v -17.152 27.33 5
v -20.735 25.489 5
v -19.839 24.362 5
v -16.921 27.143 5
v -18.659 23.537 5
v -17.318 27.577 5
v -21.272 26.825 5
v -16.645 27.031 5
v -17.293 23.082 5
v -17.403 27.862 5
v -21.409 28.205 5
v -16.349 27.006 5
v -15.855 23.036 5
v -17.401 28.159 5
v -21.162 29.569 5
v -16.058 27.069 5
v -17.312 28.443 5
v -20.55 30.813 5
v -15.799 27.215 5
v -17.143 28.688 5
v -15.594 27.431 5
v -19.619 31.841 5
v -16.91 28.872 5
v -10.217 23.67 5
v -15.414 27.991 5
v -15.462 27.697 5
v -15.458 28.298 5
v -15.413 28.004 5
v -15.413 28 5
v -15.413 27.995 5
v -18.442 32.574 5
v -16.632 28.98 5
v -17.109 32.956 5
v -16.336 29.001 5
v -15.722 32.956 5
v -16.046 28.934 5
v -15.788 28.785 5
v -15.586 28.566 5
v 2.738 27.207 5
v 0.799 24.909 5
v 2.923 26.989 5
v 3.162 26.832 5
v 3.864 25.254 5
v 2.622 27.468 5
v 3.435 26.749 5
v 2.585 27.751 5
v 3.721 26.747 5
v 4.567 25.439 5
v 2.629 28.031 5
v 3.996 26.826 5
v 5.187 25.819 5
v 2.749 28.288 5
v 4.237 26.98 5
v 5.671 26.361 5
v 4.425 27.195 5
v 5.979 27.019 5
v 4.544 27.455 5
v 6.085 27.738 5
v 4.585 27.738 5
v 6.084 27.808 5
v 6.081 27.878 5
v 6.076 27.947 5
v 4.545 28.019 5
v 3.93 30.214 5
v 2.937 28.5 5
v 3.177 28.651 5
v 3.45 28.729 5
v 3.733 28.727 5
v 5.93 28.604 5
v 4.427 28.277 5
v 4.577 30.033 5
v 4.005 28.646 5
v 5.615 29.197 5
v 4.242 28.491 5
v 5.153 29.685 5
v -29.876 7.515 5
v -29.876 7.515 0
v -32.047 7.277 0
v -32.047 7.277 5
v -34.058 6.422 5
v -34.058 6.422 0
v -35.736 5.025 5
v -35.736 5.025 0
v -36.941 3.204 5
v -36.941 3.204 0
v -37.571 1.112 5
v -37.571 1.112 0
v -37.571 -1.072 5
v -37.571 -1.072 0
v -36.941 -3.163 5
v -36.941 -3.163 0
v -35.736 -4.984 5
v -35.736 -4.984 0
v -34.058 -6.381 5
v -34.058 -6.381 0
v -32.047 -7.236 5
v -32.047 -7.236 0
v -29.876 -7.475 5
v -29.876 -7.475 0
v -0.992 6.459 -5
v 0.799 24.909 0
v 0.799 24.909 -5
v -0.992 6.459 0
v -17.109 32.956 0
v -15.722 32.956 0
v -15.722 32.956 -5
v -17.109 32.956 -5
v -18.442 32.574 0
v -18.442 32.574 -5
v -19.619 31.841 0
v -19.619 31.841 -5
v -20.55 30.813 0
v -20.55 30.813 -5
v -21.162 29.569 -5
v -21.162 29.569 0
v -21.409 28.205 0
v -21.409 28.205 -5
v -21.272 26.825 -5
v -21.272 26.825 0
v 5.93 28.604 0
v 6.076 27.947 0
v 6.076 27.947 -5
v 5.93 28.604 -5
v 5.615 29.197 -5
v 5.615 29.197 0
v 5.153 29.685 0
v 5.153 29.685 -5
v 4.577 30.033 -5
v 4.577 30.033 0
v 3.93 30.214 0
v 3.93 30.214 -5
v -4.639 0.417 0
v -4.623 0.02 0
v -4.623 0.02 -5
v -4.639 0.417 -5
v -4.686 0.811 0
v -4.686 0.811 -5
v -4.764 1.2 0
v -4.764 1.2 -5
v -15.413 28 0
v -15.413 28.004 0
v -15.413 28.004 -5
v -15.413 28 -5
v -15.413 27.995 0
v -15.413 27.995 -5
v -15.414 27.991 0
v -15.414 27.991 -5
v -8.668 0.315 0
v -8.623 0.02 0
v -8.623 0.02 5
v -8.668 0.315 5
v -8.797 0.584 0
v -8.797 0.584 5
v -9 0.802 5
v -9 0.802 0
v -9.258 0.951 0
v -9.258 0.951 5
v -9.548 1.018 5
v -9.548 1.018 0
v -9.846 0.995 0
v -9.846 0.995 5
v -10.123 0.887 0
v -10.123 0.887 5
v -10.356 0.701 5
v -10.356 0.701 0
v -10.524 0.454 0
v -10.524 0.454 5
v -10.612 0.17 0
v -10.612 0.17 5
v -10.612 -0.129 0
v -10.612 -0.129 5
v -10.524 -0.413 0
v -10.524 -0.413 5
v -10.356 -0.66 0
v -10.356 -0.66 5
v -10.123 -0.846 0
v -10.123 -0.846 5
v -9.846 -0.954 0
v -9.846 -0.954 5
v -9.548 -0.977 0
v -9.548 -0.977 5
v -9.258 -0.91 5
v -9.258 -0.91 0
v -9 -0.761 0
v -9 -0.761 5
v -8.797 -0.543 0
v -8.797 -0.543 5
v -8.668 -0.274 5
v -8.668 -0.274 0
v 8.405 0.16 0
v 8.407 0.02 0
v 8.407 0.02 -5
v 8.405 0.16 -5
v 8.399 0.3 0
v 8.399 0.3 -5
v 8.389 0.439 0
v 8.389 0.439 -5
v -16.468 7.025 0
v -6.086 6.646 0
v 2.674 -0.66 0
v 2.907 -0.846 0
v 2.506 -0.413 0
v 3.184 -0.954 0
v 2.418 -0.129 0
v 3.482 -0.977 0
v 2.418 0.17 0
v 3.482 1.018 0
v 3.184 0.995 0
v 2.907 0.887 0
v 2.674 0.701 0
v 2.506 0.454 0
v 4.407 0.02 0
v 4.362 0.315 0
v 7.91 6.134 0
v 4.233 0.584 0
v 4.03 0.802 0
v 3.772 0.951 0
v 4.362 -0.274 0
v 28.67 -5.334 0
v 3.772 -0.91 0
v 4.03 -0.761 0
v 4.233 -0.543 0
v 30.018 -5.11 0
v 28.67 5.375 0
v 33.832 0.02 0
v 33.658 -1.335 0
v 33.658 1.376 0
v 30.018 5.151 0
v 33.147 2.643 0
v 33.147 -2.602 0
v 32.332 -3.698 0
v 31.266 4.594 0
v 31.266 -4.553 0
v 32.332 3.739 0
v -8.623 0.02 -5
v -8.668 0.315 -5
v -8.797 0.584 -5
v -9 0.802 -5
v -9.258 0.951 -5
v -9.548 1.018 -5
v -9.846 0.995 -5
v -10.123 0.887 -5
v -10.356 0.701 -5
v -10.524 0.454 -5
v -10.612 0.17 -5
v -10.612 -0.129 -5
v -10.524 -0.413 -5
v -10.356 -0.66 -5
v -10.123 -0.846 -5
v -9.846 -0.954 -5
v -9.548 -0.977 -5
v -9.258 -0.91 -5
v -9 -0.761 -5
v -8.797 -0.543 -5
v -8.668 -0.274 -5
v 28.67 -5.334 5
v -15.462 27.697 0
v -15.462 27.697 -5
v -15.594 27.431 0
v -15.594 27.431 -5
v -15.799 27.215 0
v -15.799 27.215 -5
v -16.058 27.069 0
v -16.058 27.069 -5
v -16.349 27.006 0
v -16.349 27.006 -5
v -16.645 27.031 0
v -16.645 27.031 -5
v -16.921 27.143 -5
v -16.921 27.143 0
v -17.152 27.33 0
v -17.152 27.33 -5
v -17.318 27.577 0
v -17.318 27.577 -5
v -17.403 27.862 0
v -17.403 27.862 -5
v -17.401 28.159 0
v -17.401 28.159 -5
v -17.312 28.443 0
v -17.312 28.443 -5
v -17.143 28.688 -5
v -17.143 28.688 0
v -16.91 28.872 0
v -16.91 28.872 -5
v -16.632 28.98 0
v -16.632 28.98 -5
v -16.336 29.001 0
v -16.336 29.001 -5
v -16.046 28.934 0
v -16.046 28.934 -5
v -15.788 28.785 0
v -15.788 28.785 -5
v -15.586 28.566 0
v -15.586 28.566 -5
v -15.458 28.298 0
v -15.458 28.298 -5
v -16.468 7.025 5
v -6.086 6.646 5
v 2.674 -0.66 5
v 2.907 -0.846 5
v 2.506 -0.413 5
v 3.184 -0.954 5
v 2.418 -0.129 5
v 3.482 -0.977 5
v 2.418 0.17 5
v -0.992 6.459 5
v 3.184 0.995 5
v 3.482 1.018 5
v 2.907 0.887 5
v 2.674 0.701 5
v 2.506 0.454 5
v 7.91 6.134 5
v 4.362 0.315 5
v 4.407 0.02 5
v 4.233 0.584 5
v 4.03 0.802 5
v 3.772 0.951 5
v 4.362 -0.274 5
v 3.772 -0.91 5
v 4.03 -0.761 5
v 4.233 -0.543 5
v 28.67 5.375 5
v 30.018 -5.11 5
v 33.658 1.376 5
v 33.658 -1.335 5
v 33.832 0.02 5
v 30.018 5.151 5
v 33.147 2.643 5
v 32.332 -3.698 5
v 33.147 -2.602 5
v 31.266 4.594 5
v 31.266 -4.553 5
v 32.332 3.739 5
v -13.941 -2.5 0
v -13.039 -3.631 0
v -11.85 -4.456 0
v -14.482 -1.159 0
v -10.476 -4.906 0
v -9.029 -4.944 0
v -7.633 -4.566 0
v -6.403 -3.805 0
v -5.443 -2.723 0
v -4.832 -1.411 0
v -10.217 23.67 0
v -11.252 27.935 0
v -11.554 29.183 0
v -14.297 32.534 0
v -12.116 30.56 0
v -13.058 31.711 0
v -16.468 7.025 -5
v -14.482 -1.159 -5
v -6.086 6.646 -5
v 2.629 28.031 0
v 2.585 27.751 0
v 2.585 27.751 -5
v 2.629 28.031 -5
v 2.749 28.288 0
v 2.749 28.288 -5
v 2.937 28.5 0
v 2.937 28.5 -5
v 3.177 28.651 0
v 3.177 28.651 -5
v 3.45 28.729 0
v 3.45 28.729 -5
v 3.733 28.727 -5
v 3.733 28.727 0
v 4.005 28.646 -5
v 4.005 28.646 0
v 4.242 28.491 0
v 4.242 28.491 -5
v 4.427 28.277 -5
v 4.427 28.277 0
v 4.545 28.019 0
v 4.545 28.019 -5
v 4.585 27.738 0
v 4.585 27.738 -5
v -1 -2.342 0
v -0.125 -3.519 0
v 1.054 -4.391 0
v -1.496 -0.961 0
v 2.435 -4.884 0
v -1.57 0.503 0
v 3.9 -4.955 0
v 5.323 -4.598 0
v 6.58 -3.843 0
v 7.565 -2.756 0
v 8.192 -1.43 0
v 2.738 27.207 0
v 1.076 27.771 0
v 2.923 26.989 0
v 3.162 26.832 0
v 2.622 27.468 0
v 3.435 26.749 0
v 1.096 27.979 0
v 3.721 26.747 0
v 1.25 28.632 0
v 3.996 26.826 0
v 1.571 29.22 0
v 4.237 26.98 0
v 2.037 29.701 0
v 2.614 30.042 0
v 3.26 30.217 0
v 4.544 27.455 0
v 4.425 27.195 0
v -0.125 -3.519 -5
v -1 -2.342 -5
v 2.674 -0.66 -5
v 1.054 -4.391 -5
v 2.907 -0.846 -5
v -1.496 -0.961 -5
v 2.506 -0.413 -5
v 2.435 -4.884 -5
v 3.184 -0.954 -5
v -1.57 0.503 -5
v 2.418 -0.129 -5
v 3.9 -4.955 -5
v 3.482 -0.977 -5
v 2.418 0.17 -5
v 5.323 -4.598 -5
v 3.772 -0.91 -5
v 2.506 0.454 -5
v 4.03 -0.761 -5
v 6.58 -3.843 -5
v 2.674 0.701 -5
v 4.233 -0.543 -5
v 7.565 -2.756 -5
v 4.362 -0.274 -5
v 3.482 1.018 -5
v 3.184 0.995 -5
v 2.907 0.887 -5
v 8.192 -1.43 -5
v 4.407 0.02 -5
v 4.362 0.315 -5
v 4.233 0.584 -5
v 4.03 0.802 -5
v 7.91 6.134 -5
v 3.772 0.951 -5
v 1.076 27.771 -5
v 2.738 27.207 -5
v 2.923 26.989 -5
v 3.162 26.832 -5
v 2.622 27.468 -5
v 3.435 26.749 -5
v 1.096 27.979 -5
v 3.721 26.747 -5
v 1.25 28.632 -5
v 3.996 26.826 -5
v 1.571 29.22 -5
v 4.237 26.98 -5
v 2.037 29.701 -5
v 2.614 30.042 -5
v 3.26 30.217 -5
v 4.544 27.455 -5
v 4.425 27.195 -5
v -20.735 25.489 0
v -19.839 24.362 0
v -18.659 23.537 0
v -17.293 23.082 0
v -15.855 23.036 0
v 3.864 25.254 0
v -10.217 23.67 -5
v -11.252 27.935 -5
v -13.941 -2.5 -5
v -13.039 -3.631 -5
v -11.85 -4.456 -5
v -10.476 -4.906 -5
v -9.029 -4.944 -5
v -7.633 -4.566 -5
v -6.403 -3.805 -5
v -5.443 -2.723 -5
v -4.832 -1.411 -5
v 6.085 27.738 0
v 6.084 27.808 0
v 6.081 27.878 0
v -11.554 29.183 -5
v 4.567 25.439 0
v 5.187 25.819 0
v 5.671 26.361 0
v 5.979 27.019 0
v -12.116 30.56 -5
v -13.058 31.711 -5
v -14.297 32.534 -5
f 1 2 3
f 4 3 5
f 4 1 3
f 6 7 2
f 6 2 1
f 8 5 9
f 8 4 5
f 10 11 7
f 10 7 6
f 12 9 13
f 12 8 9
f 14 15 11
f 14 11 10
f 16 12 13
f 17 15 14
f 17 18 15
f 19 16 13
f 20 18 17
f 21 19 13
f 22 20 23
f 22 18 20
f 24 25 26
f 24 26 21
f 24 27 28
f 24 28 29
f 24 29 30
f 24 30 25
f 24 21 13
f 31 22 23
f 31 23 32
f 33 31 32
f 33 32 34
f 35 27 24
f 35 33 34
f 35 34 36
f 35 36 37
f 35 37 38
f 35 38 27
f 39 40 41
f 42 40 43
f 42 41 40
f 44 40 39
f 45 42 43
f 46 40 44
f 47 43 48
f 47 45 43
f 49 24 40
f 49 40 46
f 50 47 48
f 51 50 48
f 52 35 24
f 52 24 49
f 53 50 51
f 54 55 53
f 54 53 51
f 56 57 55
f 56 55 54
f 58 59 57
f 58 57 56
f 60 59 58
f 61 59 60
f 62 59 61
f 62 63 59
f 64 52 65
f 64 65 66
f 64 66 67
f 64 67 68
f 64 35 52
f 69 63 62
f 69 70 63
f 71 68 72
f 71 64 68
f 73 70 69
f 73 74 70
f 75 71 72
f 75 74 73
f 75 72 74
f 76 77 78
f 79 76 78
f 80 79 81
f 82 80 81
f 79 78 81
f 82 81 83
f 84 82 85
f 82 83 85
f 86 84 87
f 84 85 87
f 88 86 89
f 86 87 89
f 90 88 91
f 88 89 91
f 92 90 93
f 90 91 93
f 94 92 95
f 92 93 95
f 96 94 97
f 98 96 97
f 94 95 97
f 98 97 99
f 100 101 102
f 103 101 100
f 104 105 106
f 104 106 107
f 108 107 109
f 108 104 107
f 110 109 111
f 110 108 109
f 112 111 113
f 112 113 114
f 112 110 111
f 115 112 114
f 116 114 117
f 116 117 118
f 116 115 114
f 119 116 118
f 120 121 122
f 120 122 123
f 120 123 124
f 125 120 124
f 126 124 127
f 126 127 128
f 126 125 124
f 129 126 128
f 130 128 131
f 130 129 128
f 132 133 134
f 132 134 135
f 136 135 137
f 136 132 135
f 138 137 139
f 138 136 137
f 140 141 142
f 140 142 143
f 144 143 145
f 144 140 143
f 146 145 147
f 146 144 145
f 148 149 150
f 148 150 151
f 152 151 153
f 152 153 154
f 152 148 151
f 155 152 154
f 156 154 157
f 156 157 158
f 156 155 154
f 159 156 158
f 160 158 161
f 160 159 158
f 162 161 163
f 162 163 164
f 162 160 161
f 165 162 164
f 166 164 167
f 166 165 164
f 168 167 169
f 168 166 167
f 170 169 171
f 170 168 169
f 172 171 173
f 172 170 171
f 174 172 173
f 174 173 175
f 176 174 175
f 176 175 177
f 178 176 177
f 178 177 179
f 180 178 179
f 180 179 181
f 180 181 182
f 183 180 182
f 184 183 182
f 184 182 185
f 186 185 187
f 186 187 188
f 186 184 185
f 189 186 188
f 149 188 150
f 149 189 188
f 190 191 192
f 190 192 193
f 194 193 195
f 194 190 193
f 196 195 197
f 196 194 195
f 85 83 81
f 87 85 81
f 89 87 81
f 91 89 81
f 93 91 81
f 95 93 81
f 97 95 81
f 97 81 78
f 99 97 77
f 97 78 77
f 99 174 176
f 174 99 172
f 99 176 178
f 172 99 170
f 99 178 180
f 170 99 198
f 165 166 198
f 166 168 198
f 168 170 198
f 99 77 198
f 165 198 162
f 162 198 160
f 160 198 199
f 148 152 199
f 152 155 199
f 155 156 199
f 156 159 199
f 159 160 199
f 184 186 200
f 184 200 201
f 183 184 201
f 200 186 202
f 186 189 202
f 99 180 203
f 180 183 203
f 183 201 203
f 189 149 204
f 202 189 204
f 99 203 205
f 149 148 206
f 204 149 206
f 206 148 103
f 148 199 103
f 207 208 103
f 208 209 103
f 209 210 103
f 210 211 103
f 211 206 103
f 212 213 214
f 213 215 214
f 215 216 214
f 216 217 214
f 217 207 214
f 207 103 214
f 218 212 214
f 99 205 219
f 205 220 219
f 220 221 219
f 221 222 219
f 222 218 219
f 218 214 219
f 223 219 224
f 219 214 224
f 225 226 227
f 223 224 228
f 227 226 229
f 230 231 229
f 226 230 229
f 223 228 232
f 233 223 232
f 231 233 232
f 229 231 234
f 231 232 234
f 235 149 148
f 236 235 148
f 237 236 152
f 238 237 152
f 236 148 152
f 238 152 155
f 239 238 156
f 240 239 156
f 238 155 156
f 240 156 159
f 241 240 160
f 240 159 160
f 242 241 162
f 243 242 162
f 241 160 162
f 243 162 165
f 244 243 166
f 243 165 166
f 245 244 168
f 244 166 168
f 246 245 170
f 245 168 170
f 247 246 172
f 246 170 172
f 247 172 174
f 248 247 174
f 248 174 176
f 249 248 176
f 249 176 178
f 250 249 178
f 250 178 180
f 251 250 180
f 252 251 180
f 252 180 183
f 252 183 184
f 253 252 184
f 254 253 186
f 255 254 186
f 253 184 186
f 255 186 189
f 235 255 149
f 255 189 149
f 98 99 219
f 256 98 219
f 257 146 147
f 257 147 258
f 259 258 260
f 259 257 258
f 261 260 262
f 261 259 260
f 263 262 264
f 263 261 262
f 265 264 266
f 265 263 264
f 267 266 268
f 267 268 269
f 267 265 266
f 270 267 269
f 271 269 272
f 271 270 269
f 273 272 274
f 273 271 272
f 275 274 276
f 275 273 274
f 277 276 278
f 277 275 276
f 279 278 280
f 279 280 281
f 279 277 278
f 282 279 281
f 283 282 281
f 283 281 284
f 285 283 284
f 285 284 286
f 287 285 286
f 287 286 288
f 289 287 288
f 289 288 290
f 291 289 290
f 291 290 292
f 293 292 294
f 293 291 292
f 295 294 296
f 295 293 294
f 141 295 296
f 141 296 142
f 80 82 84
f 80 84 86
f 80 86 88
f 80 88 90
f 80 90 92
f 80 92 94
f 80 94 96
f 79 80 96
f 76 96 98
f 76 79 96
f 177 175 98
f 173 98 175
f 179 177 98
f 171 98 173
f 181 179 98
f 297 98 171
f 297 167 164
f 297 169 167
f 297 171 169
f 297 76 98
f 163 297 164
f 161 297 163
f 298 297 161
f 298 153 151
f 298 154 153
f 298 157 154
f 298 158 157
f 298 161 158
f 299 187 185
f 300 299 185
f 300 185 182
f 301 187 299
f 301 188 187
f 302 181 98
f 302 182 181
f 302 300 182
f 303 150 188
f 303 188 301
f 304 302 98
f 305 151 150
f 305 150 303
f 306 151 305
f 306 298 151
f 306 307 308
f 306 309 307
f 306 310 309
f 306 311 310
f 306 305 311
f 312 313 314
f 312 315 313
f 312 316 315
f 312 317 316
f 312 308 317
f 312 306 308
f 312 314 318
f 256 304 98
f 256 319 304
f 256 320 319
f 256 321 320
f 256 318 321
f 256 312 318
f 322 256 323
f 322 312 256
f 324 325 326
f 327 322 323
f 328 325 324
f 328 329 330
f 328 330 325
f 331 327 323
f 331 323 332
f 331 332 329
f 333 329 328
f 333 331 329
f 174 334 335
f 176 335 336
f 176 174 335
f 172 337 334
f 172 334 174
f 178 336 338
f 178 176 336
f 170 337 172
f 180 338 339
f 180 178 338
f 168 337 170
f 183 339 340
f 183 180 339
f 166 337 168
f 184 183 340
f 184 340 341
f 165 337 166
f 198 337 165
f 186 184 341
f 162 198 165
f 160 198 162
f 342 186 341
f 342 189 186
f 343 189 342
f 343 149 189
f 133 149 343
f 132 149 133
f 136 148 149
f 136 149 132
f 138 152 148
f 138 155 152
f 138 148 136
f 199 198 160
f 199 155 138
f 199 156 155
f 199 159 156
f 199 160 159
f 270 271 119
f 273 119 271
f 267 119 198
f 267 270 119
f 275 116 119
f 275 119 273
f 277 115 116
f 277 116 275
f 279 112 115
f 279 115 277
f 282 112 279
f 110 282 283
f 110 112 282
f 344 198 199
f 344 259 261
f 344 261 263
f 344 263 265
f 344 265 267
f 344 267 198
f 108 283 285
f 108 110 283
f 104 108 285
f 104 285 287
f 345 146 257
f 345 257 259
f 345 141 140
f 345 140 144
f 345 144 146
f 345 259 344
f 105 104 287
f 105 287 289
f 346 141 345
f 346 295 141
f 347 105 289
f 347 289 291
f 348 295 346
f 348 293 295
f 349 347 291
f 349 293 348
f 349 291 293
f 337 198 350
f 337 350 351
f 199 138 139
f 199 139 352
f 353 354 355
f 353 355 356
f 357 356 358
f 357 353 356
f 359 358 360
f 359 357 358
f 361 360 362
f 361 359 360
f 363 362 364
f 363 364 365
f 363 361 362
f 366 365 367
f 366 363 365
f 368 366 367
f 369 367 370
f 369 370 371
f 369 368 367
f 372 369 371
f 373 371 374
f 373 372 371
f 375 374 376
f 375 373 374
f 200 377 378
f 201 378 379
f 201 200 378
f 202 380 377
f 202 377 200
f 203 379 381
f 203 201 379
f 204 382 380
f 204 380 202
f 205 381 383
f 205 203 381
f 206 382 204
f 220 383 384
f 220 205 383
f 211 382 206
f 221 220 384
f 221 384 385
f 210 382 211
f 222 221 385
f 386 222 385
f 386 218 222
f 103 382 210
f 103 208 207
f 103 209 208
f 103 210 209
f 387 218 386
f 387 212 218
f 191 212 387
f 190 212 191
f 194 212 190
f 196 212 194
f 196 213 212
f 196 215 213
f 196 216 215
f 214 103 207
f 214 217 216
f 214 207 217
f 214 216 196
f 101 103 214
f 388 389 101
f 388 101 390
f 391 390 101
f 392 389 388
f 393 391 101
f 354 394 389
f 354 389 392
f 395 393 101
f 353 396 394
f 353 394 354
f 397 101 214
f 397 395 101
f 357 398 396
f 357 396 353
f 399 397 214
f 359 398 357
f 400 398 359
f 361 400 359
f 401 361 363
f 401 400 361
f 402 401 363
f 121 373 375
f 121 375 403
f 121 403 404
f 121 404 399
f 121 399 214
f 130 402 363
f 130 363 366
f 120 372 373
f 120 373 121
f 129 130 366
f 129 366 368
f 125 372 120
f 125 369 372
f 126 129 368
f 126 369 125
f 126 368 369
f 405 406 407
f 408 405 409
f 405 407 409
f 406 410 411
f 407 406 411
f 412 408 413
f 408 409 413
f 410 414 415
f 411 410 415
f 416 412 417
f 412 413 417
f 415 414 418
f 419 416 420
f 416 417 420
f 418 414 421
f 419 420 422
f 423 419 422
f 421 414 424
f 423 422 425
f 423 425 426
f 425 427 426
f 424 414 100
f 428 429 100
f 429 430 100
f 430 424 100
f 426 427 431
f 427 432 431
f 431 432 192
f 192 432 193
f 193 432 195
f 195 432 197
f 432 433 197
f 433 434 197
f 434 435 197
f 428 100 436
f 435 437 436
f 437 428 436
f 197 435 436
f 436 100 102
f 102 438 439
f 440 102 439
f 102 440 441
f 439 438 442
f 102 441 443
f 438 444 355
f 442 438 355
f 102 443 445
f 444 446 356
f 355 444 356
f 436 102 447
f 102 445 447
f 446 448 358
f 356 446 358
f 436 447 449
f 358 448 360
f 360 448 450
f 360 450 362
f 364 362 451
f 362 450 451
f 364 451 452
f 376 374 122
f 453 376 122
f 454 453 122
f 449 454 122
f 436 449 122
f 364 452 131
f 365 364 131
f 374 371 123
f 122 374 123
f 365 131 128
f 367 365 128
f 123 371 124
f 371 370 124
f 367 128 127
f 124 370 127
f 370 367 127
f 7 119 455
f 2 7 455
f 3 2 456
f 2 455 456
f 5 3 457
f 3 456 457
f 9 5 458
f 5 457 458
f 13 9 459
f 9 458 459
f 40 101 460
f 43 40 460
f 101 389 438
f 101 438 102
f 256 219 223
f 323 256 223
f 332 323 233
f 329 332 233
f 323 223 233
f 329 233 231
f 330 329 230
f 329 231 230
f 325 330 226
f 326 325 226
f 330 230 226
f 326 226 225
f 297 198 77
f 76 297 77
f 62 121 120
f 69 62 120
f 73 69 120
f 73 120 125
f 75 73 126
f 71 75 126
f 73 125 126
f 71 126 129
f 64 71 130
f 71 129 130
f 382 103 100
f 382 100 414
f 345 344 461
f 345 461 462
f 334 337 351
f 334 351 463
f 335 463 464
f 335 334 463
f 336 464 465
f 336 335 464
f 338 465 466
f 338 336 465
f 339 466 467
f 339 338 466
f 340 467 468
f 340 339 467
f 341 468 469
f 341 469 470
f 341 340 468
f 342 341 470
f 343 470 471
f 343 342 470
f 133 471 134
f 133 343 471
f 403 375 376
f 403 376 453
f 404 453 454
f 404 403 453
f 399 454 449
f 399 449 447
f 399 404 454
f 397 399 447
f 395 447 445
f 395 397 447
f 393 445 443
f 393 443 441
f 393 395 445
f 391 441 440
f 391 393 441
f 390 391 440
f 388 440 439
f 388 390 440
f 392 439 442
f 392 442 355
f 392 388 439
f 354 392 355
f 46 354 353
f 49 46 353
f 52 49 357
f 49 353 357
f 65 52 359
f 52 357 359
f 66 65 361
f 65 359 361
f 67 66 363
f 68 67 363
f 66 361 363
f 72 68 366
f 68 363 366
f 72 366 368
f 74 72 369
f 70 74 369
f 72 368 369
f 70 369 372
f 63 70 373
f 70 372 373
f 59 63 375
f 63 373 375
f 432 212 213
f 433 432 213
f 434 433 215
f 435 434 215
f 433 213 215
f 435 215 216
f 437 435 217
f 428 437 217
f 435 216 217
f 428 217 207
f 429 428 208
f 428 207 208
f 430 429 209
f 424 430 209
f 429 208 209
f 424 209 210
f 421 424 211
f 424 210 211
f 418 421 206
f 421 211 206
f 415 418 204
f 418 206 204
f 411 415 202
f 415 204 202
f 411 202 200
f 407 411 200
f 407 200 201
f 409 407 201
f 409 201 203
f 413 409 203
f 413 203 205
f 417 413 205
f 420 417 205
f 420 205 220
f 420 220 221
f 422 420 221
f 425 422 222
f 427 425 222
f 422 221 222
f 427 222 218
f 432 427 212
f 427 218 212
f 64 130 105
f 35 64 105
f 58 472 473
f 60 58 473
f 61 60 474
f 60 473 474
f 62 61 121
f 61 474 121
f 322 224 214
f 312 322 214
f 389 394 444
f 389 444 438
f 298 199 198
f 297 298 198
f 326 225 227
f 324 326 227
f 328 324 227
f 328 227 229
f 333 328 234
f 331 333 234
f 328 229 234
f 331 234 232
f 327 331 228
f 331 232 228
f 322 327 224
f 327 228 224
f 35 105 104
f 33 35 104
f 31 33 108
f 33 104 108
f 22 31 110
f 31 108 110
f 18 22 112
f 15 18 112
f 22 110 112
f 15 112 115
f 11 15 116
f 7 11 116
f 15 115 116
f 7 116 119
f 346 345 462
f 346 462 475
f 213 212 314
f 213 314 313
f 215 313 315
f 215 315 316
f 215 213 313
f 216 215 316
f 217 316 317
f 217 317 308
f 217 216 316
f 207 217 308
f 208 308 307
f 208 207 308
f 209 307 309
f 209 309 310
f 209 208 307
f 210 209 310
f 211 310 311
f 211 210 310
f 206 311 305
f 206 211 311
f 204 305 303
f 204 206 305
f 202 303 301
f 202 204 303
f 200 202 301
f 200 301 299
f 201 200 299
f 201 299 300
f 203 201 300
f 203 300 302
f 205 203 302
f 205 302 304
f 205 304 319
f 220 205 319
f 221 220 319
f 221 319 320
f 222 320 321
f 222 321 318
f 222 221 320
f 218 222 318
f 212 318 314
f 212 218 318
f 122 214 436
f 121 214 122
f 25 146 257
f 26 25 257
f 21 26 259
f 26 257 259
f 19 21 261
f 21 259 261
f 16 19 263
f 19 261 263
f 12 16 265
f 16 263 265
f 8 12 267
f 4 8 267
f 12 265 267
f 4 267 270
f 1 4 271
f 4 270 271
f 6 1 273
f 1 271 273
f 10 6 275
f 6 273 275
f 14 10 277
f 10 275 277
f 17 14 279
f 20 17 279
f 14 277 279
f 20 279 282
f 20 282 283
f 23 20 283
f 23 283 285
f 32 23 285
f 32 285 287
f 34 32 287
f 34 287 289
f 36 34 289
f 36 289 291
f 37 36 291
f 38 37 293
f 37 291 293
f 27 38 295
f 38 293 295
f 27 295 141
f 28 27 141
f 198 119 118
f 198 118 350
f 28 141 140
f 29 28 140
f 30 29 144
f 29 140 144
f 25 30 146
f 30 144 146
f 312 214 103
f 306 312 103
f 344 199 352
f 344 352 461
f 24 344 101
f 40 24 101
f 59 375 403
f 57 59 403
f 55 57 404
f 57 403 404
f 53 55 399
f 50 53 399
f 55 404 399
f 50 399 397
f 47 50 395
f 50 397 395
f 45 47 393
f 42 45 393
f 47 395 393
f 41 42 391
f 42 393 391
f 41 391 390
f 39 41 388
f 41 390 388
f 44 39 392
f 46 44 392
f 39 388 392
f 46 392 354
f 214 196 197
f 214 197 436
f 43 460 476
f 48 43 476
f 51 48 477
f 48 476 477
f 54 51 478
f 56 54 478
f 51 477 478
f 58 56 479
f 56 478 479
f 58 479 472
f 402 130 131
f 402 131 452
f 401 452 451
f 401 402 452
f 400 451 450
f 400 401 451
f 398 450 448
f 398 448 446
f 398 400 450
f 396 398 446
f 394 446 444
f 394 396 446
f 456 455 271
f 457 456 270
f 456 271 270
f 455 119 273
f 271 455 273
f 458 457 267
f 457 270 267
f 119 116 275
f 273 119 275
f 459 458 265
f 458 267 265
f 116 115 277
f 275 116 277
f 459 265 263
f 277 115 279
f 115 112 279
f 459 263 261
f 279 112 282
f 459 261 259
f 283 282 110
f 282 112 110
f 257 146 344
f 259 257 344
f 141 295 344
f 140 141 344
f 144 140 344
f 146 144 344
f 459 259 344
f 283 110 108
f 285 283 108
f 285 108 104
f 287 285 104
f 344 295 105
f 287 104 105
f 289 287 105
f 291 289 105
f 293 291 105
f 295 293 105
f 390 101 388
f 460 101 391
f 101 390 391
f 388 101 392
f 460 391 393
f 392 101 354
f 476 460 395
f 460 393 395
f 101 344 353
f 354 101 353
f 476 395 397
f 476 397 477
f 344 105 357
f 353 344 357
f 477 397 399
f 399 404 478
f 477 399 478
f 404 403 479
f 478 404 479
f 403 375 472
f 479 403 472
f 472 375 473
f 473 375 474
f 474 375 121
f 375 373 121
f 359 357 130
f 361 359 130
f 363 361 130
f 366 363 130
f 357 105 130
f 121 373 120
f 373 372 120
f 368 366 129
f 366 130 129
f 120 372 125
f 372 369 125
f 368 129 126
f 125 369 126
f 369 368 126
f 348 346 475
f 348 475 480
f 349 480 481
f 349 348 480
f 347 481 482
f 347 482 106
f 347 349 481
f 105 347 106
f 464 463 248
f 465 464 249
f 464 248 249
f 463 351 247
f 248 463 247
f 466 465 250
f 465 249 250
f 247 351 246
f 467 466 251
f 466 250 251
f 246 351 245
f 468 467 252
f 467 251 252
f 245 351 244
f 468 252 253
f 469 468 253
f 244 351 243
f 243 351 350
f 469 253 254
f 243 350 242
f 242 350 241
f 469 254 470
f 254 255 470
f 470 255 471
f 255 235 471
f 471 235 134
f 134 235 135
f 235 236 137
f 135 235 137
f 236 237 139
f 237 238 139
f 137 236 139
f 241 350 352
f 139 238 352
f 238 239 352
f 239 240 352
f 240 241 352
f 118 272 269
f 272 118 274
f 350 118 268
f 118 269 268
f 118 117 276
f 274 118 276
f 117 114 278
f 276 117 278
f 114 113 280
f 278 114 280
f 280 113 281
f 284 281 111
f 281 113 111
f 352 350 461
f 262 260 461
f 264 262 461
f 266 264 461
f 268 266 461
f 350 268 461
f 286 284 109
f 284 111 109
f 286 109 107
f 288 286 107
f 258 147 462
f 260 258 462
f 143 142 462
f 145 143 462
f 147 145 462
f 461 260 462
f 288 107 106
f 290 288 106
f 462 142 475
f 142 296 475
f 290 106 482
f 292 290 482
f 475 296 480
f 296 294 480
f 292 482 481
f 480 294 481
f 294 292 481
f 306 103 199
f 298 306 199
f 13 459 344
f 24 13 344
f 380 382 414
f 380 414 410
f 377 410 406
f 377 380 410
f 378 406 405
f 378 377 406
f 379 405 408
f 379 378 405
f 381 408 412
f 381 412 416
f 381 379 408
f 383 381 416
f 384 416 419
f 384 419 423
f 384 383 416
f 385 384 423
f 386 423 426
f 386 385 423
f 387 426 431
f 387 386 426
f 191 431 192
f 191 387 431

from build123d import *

# Parameters (mm, degrees)
F1_DEPTH = 5
F0_R     = 1
F2_DEPTH = 5


with BuildPart() as f1:
    # F0 (on Top) → F1 (new body)
    with BuildSketch(Plane.XY):
        with BuildLine():
            ThreePointArc((-15.854500332, 23.0355131938), (-12.7077701873, 24.6473721814), (-11.4138670862, 27.9376327737))
            ThreePointArc((-11.4138670862, 27.9376327737), (-11.4135349787, 27.9709033455), (-11.4134242746, 28.0041753906))
            ThreePointArc((-11.4134242746, 28.0041753906), (-11.4488005891, 28.5979023154), (-11.5544289391, 29.1832276921))
            ThreePointArc((-11.5544289391, 29.1832276921), (-13.057928846, 31.7110137238), (-15.72245892, 32.9562019333))
            ThreePointArc((-15.72245892, 32.9562019333), (-20.1202626078, 31.3596708193), (-21.2724196101, 26.8251230892))
            ThreePointArc((-21.2724196101, 26.8251230892), (-19.279246894, 23.9069738196), (-15.854500332, 23.0355131938))
        make_face()
        with BuildLine():
            ThreePointArc((-15.4134242746, 28.0041753906), (-15.4134464154, 27.9975209816), (-15.4135128369, 27.9908668673))
            ThreePointArc((-15.4135128369, 27.9908668673), (-17.4134021338, 28.0108297997), (-15.4134242746, 28.0041753906))
        make_face(mode=Mode.SUBTRACT)
        with BuildLine():
            Line((-11.5544289391, 29.1832276921), (-11.2516570719, 27.9354738067))
            Line((-11.2516570719, 27.9354738067), (1.0763007318, 27.7713923605))
            Line((1.0763007318, 27.7713923605), (1.0964932824, 27.9794741519))
            ThreePointArc((1.0964932824, 27.9794741519), (2.036829904, 29.7011082607), (3.9302871563, 30.2140181942))
            Line((3.9302871563, 30.2140181942), (-15.72245892, 32.9562019333))
            ThreePointArc((-15.72245892, 32.9562019333), (-13.057928846, 31.7110137238), (-11.5544289391, 29.1832276921))
        make_face()
        with BuildLine():
            ThreePointArc((1.0964932824, 27.9794741519), (1.0885880353, 27.875494799), (1.0850258848, 27.7712762313))
            ThreePointArc((1.0850258848, 27.7712762313), (1.9064028744, 25.8851778792), (3.8642664503, 25.2536738244))
            ThreePointArc((3.8642664503, 25.2536738244), (5.4487592704, 26.0719699485), (6.084804479, 27.7380049229))
            ThreePointArc((6.084804479, 27.7380049229), (6.0826053348, 27.842842344), (6.0760117711, 27.9474953231))
            ThreePointArc((6.0760117711, 27.9474953231), (5.400288981, 29.4567300385), (3.9302871563, 30.2140181942))
            ThreePointArc((3.9302871563, 30.2140181942), (2.036829904, 29.7011082607), (1.0964932824, 27.9794741519))
        make_face()
        with BuildLine():
            ThreePointArc((4.584804479, 27.7380049229), (3.57815007, 26.7380270637), (2.5848930414, 27.7513134463))
            ThreePointArc((2.5848930414, 27.7513134463), (3.5914588881, 28.737982782), (4.584804479, 27.7380049229))
        make_face(mode=Mode.SUBTRACT)
        with BuildLine():
            Line((1.0850258848, 27.7712762313), (1.0763007318, 27.7713923605))
            Line((1.0763007318, 27.7713923605), (0.7985114663, 24.9088075818))
            Line((0.7985114663, 24.9088075818), (3.8642664503, 25.2536738244))
            ThreePointArc((3.8642664503, 25.2536738244), (1.9064028744, 25.8851778792), (1.0850258848, 27.7712762313))
        make_face()
        Polygon((1.0763007318, 27.7713923605), (-11.2516570719, 27.9354738067), (-10.2165579676, 23.6697243455), (0.7985114663, 24.9088075818), align=None)
        with BuildLine():
            Line((-11.2516570719, 27.9354738067), (-11.4138670862, 27.9376327737))
            ThreePointArc((-11.4138670862, 27.9376327737), (-12.7077701873, 24.6473721814), (-15.854500332, 23.0355131938))
            Line((-15.854500332, 23.0355131938), (-10.2165579676, 23.6697243455))
            Line((-10.2165579676, 23.6697243455), (-11.2516570719, 27.9354738067))
        make_face()
        with BuildLine():
            ThreePointArc((-11.4134242746, 28.0041753906), (-11.4135349787, 27.9709033455), (-11.4138670862, 27.9376327737))
            Line((-11.4138670862, 27.9376327737), (-11.2516570719, 27.9354738067))
            Line((-11.2516570719, 27.9354738067), (-11.5544289391, 29.1832276921))
            ThreePointArc((-11.5544289391, 29.1832276921), (-11.4488005891, 28.5979023154), (-11.4134242746, 28.0041753906))
        make_face()
        with BuildLine():
            Line((1.0964932824, 27.9794741519), (1.0763007318, 27.7713923605))
            Line((1.0763007318, 27.7713923605), (1.0850258848, 27.7712762313))
            ThreePointArc((1.0850258848, 27.7712762313), (1.0885880353, 27.875494799), (1.0964932824, 27.9794741519))
        make_face()
    extrude(amount=F1_DEPTH)


with BuildPart() as f1b:
    # F0 (on Top) → F1, piece 2 (new body)
    with BuildSketch(Plane.XY):
        with BuildLine():
            ThreePointArc((-22.6505047828, 0.0204806253), (-24.751195421, 5.2260025411), (-29.8764936936, 7.5154734821))
            ThreePointArc((-29.8764936936, 7.5154734821), (-37.6505047828, 0.0204806253), (-29.8764936936, -7.4745122315))
            ThreePointArc((-29.8764936936, -7.4745122315), (-24.751195421, -5.1850412904), (-22.6505047828, 0.0204806253))
        make_face()
        with BuildLine():
            Line((-0.9918379888, 6.4594730131), (-6.0856180335, 6.645697636))
            Line((-6.0856180335, 6.645697636), (-4.7640870192, 1.1995329267))
            ThreePointArc((-4.7640870192, 1.1995329267), (-4.6584586692, 0.6142075501), (-4.6230823547, 0.0204806253))
            ThreePointArc((-4.6230823547, 0.0204806253), (-9.0293554299, -4.9441430602), (-14.4820776902, -1.1585716761))
            Line((-14.4820776902, -1.1585716761), (-16.467914748, 7.0252663008))
            Line((-16.467914748, 7.0252663008), (-29.8764936936, 7.5154734821))
            ThreePointArc((-29.8764936936, 7.5154734821), (-24.751195421, 5.2260025411), (-22.6505047828, 0.0204806253))
            ThreePointArc((-22.6505047828, 0.0204806253), (-24.751195421, -5.1850412904), (-29.8764936936, -7.4745122315))
            Line((-29.8764936936, -7.4745122315), (28.6700100147, -5.3340977497))
            ThreePointArc((28.6700100147, -5.3340977497), (23.1160952264, 0.0204806253), (28.6700100147, 5.3750590003))
            Line((28.6700100147, 5.3750590003), (7.9103490939, 6.1340160013))
            Line((7.9103490939, 6.1340160013), (8.3892151125, 0.4394614259))
            ThreePointArc((8.3892151125, 0.4394614259), (8.4024022398, 0.2301554677), (8.4068005283, 0.0204806253))
            ThreePointArc((8.4068005283, 0.0204806253), (3.1650485547, -4.9736715533), (-1.5698218651, 0.5034190834))
            Line((-1.5698218651, 0.5034190834), (-0.9918379888, 6.4594730131))
        make_face()
        with BuildLine():
            ThreePointArc((33.8324063903, 0.0204806253), (32.3316294211, 3.7394134666), (28.6700100147, 5.3750590003))
            ThreePointArc((28.6700100147, 5.3750590003), (23.1160952264, 0.0204806253), (28.6700100147, -5.3340977497))
            ThreePointArc((28.6700100147, -5.3340977497), (32.3316294211, -3.698452216), (33.8324063903, 0.0204806253))
        make_face()
        with BuildLine():
            Line((7.9103490939, 6.1340160013), (-0.9918379888, 6.4594730131))
            Line((-0.9918379888, 6.4594730131), (-1.5698218651, 0.5034190834))
            ThreePointArc((-1.5698218651, 0.5034190834), (3.4389102287, 5.020377521), (8.3892151125, 0.4394614259))
            Line((8.3892151125, 0.4394614259), (7.9103490939, 6.1340160013))
        make_face()
        with BuildLine():
            ThreePointArc((8.3892151125, 0.4394614259), (3.4389102287, 5.020377521), (-1.5698218651, 0.5034190834))
            ThreePointArc((-1.5698218651, 0.5034190834), (3.1650485547, -4.9736715533), (8.4068005283, 0.0204806253))
            ThreePointArc((8.4068005283, 0.0204806253), (8.4024022398, 0.2301554677), (8.3892151125, 0.4394614259))
        make_face()
        with Locations((3.4068005283, 0.0204806253)):
            Circle(F0_R, mode=Mode.SUBTRACT)
        with BuildLine():
            ThreePointArc((-4.6230823547, 0.0204806253), (-4.6584586692, 0.6142075501), (-4.7640870192, 1.1995329267))
            ThreePointArc((-4.7640870192, 1.1995329267), (-10.8021346561, 4.8794759608), (-14.4820776902, -1.1585716761))
            ThreePointArc((-14.4820776902, -1.1585716761), (-9.0293554299, -4.9441430602), (-4.6230823547, 0.0204806253))
        make_face()
        with Locations((-9.6230823547, 0.0204806253)):
            Circle(F0_R, mode=Mode.SUBTRACT)
        with BuildLine():
            Line((-4.7640870192, 1.1995329267), (-6.0856180335, 6.645697636))
            Line((-6.0856180335, 6.645697636), (-16.467914748, 7.0252663008))
            Line((-16.467914748, 7.0252663008), (-14.4820776902, -1.1585716761))
            ThreePointArc((-14.4820776902, -1.1585716761), (-10.8021346561, 4.8794759608), (-4.7640870192, 1.1995329267))
        make_face()
    extrude(amount=F1_DEPTH)


with BuildPart() as f2:
    # F0 (on Top) → F2 (new body)
    with BuildSketch(Plane.XY):
        with BuildLine():
            ThreePointArc((-15.854500332, 23.0355131938), (-12.7077701873, 24.6473721814), (-11.4138670862, 27.9376327737))
            ThreePointArc((-11.4138670862, 27.9376327737), (-11.4135349787, 27.9709033455), (-11.4134242746, 28.0041753906))
            ThreePointArc((-11.4134242746, 28.0041753906), (-11.4488005891, 28.5979023154), (-11.5544289391, 29.1832276921))
            ThreePointArc((-11.5544289391, 29.1832276921), (-13.057928846, 31.7110137238), (-15.72245892, 32.9562019333))
            ThreePointArc((-15.72245892, 32.9562019333), (-20.1202626078, 31.3596708193), (-21.2724196101, 26.8251230892))
            ThreePointArc((-21.2724196101, 26.8251230892), (-19.279246894, 23.9069738196), (-15.854500332, 23.0355131938))
        make_face()
        with BuildLine():
            ThreePointArc((-15.4134242746, 28.0041753906), (-15.4134464154, 27.9975209816), (-15.4135128369, 27.9908668673))
            ThreePointArc((-15.4135128369, 27.9908668673), (-17.4134021338, 28.0108297997), (-15.4134242746, 28.0041753906))
        make_face(mode=Mode.SUBTRACT)
        with BuildLine():
            ThreePointArc((-11.4134242746, 28.0041753906), (-11.4135349787, 27.9709033455), (-11.4138670862, 27.9376327737))
            Line((-11.4138670862, 27.9376327737), (-11.2516570719, 27.9354738067))
            Line((-11.2516570719, 27.9354738067), (-11.5544289391, 29.1832276921))
            ThreePointArc((-11.5544289391, 29.1832276921), (-11.4488005891, 28.5979023154), (-11.4134242746, 28.0041753906))
        make_face()
        with BuildLine():
            Line((-11.2516570719, 27.9354738067), (-11.4138670862, 27.9376327737))
            ThreePointArc((-11.4138670862, 27.9376327737), (-12.7077701873, 24.6473721814), (-15.854500332, 23.0355131938))
            Line((-15.854500332, 23.0355131938), (-10.2165579676, 23.6697243455))
            Line((-10.2165579676, 23.6697243455), (-11.2516570719, 27.9354738067))
        make_face()
        with BuildLine():
            Line((-10.2165579676, 23.6697243455), (-15.854500332, 23.0355131938))
            ThreePointArc((-15.854500332, 23.0355131938), (-19.279246894, 23.9069738196), (-21.2724196101, 26.8251230892))
            Line((-21.2724196101, 26.8251230892), (-16.467914748, 7.0252663008))
            Line((-16.467914748, 7.0252663008), (-6.0856180335, 6.645697636))
            Line((-6.0856180335, 6.645697636), (-10.2165579676, 23.6697243455))
        make_face()
        with BuildLine():
            Line((-4.7640870192, 1.1995329267), (-6.0856180335, 6.645697636))
            Line((-6.0856180335, 6.645697636), (-16.467914748, 7.0252663008))
            Line((-16.467914748, 7.0252663008), (-14.4820776902, -1.1585716761))
            ThreePointArc((-14.4820776902, -1.1585716761), (-10.8021346561, 4.8794759608), (-4.7640870192, 1.1995329267))
        make_face()
        with BuildLine():
            ThreePointArc((-4.6230823547, 0.0204806253), (-4.6584586692, 0.6142075501), (-4.7640870192, 1.1995329267))
            ThreePointArc((-4.7640870192, 1.1995329267), (-10.8021346561, 4.8794759608), (-14.4820776902, -1.1585716761))
            ThreePointArc((-14.4820776902, -1.1585716761), (-9.0293554299, -4.9441430602), (-4.6230823547, 0.0204806253))
        make_face()
        with Locations((-9.6230823547, 0.0204806253)):
            Circle(F0_R, mode=Mode.SUBTRACT)
    extrude(amount=-F2_DEPTH)


with BuildPart() as f2b:
    # F0 (on Top) → F2, piece 2 (new body)
    with BuildSketch(Plane.XY):
        with BuildLine():
            ThreePointArc((8.3892151125, 0.4394614259), (3.4389102287, 5.020377521), (-1.5698218651, 0.5034190834))
            ThreePointArc((-1.5698218651, 0.5034190834), (3.1650485547, -4.9736715533), (8.4068005283, 0.0204806253))
            ThreePointArc((8.4068005283, 0.0204806253), (8.4024022398, 0.2301554677), (8.3892151125, 0.4394614259))
        make_face()
        with Locations((3.4068005283, 0.0204806253)):
            Circle(F0_R, mode=Mode.SUBTRACT)
        with BuildLine():
            Line((7.9103490939, 6.1340160013), (-0.9918379888, 6.4594730131))
            Line((-0.9918379888, 6.4594730131), (-1.5698218651, 0.5034190834))
            ThreePointArc((-1.5698218651, 0.5034190834), (3.4389102287, 5.020377521), (8.3892151125, 0.4394614259))
            Line((8.3892151125, 0.4394614259), (7.9103490939, 6.1340160013))
        make_face()
        with BuildLine():
            Line((3.8642664503, 25.2536738244), (0.7985114663, 24.9088075818))
            Line((0.7985114663, 24.9088075818), (-0.9918379888, 6.4594730131))
            Line((-0.9918379888, 6.4594730131), (7.9103490939, 6.1340160013))
            Line((7.9103490939, 6.1340160013), (6.0760117711, 27.9474953231))
            ThreePointArc((6.0760117711, 27.9474953231), (6.0826053348, 27.842842344), (6.084804479, 27.7380049229))
            ThreePointArc((6.084804479, 27.7380049229), (5.4487592704, 26.0719699485), (3.8642664503, 25.2536738244))
        make_face()
        with BuildLine():
            Line((1.0850258848, 27.7712762313), (1.0763007318, 27.7713923605))
            Line((1.0763007318, 27.7713923605), (0.7985114663, 24.9088075818))
            Line((0.7985114663, 24.9088075818), (3.8642664503, 25.2536738244))
            ThreePointArc((3.8642664503, 25.2536738244), (1.9064028744, 25.8851778792), (1.0850258848, 27.7712762313))
        make_face()
        with BuildLine():
            ThreePointArc((1.0964932824, 27.9794741519), (1.0885880353, 27.875494799), (1.0850258848, 27.7712762313))
            ThreePointArc((1.0850258848, 27.7712762313), (1.9064028744, 25.8851778792), (3.8642664503, 25.2536738244))
            ThreePointArc((3.8642664503, 25.2536738244), (5.4487592704, 26.0719699485), (6.084804479, 27.7380049229))
            ThreePointArc((6.084804479, 27.7380049229), (6.0826053348, 27.842842344), (6.0760117711, 27.9474953231))
            ThreePointArc((6.0760117711, 27.9474953231), (5.400288981, 29.4567300385), (3.9302871563, 30.2140181942))
            ThreePointArc((3.9302871563, 30.2140181942), (2.036829904, 29.7011082607), (1.0964932824, 27.9794741519))
        make_face()
        with BuildLine():
            ThreePointArc((4.584804479, 27.7380049229), (3.57815007, 26.7380270637), (2.5848930414, 27.7513134463))
            ThreePointArc((2.5848930414, 27.7513134463), (3.5914588881, 28.737982782), (4.584804479, 27.7380049229))
        make_face(mode=Mode.SUBTRACT)
        with BuildLine():
            Line((1.0964932824, 27.9794741519), (1.0763007318, 27.7713923605))
            Line((1.0763007318, 27.7713923605), (1.0850258848, 27.7712762313))
            ThreePointArc((1.0850258848, 27.7712762313), (1.0885880353, 27.875494799), (1.0964932824, 27.9794741519))
        make_face()
    extrude(amount=-F2_DEPTH)


solid = Compound([f1.part, f1b.part, f2.part, f2b.part])
